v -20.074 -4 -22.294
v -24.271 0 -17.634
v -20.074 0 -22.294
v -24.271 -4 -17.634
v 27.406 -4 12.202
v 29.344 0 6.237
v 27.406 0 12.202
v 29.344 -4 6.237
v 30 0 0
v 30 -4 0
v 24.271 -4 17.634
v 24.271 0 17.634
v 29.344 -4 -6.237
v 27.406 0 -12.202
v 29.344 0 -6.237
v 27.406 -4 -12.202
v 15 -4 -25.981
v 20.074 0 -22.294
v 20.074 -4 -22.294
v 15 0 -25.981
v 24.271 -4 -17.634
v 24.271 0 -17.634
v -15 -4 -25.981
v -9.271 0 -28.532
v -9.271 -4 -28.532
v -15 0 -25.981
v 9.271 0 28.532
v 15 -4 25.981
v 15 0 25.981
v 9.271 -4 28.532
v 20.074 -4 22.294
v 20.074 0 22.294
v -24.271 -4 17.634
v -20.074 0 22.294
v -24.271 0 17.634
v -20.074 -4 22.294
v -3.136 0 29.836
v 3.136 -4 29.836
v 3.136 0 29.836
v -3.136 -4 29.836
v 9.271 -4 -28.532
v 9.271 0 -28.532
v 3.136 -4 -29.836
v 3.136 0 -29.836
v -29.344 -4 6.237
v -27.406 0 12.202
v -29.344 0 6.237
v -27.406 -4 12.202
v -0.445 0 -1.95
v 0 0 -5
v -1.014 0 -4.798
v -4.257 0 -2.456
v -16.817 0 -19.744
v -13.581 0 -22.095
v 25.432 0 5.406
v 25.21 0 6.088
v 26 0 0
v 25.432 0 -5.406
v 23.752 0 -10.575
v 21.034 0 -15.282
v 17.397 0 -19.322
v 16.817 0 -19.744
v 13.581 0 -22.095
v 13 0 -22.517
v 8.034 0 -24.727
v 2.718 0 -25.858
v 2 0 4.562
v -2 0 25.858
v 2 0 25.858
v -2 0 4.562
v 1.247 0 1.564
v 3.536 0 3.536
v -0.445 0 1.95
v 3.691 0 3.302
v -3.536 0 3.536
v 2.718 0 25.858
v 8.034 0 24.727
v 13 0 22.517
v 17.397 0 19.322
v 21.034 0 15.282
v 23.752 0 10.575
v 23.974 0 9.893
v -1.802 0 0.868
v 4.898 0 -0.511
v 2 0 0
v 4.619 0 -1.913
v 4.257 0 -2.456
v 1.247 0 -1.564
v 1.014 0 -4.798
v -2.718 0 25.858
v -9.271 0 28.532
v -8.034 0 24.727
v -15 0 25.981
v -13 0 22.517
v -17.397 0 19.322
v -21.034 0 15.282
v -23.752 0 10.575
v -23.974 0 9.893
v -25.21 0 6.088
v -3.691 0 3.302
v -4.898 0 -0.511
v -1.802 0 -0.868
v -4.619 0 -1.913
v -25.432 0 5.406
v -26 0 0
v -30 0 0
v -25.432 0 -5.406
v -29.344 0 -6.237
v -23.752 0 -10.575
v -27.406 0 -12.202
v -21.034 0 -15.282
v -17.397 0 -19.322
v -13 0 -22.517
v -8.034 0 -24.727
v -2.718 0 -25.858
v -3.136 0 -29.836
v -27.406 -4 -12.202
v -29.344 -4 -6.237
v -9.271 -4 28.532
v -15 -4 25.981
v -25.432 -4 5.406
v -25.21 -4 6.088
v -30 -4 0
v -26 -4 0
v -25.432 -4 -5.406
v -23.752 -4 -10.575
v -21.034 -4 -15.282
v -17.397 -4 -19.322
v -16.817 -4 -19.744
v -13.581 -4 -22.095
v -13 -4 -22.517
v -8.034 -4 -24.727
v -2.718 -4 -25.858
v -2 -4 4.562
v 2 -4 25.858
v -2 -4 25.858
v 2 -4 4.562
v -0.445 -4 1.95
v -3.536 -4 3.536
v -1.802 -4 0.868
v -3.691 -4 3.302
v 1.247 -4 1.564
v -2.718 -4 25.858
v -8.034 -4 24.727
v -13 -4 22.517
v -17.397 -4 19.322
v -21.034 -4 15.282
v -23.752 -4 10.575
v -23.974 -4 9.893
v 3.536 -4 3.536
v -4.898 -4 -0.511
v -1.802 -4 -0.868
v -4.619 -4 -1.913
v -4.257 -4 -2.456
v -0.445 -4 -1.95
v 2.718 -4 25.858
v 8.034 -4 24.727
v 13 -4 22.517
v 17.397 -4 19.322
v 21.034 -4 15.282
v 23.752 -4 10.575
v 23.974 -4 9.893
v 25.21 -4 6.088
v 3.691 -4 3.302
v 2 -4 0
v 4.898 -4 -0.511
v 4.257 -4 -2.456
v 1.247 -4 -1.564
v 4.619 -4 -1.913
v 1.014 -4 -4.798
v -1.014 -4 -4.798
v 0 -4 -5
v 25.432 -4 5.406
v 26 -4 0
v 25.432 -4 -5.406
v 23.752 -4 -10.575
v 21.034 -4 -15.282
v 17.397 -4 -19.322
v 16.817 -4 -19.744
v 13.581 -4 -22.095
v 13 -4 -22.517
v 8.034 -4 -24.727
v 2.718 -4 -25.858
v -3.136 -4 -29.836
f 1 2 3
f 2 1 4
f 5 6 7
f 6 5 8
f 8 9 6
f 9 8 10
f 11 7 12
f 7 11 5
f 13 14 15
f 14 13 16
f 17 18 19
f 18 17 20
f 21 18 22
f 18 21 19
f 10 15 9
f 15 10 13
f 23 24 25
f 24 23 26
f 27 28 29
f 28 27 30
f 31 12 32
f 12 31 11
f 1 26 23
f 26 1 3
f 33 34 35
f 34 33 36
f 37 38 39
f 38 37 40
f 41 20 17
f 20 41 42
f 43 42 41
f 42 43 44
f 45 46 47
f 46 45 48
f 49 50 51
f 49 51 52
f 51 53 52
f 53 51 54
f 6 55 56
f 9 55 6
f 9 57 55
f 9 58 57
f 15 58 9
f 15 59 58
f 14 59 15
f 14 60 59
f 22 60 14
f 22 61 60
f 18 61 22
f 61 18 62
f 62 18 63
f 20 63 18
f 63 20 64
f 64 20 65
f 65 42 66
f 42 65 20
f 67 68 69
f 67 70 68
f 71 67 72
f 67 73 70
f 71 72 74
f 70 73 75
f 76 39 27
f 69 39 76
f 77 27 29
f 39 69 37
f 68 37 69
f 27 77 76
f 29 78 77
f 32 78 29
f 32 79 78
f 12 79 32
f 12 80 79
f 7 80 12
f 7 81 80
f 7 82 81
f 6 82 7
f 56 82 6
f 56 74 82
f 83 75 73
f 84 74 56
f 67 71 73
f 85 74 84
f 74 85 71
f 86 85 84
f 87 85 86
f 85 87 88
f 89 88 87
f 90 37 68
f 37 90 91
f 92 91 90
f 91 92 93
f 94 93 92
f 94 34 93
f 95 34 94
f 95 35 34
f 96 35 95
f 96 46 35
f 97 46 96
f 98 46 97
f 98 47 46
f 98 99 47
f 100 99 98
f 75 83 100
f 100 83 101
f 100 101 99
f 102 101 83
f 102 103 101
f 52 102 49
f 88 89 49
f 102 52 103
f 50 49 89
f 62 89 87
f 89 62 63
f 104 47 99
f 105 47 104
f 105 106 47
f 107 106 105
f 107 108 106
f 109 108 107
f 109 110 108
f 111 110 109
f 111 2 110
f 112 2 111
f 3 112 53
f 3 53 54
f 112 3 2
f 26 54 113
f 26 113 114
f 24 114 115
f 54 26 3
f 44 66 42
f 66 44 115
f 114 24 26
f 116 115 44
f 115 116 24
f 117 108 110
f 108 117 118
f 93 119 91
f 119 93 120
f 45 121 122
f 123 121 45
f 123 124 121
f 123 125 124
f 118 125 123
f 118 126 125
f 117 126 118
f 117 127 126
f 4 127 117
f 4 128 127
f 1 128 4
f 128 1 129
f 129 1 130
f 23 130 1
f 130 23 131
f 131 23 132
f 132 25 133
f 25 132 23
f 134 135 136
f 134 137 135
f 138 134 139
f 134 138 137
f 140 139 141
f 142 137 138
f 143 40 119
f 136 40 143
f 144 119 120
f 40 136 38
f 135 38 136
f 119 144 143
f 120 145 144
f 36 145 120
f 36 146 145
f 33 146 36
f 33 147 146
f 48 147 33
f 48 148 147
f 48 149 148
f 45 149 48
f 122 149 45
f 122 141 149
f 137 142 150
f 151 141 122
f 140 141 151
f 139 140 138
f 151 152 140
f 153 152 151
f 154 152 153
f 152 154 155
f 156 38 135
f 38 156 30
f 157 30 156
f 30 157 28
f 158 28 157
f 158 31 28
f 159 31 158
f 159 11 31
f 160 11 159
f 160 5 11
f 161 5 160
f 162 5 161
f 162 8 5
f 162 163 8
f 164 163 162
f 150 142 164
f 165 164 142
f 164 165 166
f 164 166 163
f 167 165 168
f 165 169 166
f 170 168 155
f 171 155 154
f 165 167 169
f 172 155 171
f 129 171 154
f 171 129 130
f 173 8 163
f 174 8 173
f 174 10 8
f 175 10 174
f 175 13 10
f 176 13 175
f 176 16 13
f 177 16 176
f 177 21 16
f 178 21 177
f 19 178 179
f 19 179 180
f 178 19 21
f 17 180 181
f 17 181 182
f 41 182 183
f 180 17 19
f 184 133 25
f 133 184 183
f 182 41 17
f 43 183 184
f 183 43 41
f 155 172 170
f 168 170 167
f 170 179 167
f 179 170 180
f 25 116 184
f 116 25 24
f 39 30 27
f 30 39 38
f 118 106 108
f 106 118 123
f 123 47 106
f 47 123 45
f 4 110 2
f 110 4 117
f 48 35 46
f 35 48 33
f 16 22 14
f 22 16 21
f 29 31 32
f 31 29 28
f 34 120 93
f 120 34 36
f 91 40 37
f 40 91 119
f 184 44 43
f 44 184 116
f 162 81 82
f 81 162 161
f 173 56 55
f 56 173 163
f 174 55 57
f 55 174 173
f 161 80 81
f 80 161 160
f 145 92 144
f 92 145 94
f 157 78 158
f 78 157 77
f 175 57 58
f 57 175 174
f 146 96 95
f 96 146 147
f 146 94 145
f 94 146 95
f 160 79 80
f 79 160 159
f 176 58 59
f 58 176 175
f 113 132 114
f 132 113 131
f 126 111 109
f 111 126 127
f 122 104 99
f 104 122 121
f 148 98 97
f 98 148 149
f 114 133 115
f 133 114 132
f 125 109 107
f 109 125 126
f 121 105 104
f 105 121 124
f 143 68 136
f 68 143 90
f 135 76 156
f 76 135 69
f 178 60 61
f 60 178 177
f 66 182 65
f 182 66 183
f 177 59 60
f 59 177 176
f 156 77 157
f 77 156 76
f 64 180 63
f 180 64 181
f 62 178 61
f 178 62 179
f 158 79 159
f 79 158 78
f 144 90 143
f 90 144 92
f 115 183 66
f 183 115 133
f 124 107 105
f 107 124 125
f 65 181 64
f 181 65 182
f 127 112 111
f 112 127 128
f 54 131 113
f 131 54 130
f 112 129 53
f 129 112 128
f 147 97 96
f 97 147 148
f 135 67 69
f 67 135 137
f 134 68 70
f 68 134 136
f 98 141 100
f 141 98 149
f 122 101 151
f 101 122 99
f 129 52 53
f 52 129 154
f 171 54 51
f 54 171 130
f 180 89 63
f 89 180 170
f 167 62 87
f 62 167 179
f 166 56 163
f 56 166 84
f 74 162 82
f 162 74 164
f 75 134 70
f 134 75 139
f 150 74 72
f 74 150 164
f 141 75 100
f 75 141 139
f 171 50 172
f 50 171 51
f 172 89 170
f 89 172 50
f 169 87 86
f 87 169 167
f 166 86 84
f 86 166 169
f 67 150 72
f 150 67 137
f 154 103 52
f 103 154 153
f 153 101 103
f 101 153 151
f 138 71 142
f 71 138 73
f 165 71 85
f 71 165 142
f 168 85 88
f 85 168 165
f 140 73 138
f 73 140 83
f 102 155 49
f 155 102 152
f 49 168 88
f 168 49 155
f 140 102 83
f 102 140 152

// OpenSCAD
width = 4;
hub = 5;
radius = 30;
spokes = 5;

// remove rotate for printing
rotate([90, 0, 0]) {
    difference() {
        cylinder(h=width, r=radius);
        cylinder(h=width, r=radius - width);
    }
    difference() {
        union() {
            cylinder(h=width, r=hub);
            for (i = [0 : spokes-1]) {
                rotate([0, 0, 360/spokes * i])
                translate([-width/2, 0, 0])
                    cube([width, radius-width, width]);
            }
        }
        cylinder(h=width, r=width/2);
    }
}
